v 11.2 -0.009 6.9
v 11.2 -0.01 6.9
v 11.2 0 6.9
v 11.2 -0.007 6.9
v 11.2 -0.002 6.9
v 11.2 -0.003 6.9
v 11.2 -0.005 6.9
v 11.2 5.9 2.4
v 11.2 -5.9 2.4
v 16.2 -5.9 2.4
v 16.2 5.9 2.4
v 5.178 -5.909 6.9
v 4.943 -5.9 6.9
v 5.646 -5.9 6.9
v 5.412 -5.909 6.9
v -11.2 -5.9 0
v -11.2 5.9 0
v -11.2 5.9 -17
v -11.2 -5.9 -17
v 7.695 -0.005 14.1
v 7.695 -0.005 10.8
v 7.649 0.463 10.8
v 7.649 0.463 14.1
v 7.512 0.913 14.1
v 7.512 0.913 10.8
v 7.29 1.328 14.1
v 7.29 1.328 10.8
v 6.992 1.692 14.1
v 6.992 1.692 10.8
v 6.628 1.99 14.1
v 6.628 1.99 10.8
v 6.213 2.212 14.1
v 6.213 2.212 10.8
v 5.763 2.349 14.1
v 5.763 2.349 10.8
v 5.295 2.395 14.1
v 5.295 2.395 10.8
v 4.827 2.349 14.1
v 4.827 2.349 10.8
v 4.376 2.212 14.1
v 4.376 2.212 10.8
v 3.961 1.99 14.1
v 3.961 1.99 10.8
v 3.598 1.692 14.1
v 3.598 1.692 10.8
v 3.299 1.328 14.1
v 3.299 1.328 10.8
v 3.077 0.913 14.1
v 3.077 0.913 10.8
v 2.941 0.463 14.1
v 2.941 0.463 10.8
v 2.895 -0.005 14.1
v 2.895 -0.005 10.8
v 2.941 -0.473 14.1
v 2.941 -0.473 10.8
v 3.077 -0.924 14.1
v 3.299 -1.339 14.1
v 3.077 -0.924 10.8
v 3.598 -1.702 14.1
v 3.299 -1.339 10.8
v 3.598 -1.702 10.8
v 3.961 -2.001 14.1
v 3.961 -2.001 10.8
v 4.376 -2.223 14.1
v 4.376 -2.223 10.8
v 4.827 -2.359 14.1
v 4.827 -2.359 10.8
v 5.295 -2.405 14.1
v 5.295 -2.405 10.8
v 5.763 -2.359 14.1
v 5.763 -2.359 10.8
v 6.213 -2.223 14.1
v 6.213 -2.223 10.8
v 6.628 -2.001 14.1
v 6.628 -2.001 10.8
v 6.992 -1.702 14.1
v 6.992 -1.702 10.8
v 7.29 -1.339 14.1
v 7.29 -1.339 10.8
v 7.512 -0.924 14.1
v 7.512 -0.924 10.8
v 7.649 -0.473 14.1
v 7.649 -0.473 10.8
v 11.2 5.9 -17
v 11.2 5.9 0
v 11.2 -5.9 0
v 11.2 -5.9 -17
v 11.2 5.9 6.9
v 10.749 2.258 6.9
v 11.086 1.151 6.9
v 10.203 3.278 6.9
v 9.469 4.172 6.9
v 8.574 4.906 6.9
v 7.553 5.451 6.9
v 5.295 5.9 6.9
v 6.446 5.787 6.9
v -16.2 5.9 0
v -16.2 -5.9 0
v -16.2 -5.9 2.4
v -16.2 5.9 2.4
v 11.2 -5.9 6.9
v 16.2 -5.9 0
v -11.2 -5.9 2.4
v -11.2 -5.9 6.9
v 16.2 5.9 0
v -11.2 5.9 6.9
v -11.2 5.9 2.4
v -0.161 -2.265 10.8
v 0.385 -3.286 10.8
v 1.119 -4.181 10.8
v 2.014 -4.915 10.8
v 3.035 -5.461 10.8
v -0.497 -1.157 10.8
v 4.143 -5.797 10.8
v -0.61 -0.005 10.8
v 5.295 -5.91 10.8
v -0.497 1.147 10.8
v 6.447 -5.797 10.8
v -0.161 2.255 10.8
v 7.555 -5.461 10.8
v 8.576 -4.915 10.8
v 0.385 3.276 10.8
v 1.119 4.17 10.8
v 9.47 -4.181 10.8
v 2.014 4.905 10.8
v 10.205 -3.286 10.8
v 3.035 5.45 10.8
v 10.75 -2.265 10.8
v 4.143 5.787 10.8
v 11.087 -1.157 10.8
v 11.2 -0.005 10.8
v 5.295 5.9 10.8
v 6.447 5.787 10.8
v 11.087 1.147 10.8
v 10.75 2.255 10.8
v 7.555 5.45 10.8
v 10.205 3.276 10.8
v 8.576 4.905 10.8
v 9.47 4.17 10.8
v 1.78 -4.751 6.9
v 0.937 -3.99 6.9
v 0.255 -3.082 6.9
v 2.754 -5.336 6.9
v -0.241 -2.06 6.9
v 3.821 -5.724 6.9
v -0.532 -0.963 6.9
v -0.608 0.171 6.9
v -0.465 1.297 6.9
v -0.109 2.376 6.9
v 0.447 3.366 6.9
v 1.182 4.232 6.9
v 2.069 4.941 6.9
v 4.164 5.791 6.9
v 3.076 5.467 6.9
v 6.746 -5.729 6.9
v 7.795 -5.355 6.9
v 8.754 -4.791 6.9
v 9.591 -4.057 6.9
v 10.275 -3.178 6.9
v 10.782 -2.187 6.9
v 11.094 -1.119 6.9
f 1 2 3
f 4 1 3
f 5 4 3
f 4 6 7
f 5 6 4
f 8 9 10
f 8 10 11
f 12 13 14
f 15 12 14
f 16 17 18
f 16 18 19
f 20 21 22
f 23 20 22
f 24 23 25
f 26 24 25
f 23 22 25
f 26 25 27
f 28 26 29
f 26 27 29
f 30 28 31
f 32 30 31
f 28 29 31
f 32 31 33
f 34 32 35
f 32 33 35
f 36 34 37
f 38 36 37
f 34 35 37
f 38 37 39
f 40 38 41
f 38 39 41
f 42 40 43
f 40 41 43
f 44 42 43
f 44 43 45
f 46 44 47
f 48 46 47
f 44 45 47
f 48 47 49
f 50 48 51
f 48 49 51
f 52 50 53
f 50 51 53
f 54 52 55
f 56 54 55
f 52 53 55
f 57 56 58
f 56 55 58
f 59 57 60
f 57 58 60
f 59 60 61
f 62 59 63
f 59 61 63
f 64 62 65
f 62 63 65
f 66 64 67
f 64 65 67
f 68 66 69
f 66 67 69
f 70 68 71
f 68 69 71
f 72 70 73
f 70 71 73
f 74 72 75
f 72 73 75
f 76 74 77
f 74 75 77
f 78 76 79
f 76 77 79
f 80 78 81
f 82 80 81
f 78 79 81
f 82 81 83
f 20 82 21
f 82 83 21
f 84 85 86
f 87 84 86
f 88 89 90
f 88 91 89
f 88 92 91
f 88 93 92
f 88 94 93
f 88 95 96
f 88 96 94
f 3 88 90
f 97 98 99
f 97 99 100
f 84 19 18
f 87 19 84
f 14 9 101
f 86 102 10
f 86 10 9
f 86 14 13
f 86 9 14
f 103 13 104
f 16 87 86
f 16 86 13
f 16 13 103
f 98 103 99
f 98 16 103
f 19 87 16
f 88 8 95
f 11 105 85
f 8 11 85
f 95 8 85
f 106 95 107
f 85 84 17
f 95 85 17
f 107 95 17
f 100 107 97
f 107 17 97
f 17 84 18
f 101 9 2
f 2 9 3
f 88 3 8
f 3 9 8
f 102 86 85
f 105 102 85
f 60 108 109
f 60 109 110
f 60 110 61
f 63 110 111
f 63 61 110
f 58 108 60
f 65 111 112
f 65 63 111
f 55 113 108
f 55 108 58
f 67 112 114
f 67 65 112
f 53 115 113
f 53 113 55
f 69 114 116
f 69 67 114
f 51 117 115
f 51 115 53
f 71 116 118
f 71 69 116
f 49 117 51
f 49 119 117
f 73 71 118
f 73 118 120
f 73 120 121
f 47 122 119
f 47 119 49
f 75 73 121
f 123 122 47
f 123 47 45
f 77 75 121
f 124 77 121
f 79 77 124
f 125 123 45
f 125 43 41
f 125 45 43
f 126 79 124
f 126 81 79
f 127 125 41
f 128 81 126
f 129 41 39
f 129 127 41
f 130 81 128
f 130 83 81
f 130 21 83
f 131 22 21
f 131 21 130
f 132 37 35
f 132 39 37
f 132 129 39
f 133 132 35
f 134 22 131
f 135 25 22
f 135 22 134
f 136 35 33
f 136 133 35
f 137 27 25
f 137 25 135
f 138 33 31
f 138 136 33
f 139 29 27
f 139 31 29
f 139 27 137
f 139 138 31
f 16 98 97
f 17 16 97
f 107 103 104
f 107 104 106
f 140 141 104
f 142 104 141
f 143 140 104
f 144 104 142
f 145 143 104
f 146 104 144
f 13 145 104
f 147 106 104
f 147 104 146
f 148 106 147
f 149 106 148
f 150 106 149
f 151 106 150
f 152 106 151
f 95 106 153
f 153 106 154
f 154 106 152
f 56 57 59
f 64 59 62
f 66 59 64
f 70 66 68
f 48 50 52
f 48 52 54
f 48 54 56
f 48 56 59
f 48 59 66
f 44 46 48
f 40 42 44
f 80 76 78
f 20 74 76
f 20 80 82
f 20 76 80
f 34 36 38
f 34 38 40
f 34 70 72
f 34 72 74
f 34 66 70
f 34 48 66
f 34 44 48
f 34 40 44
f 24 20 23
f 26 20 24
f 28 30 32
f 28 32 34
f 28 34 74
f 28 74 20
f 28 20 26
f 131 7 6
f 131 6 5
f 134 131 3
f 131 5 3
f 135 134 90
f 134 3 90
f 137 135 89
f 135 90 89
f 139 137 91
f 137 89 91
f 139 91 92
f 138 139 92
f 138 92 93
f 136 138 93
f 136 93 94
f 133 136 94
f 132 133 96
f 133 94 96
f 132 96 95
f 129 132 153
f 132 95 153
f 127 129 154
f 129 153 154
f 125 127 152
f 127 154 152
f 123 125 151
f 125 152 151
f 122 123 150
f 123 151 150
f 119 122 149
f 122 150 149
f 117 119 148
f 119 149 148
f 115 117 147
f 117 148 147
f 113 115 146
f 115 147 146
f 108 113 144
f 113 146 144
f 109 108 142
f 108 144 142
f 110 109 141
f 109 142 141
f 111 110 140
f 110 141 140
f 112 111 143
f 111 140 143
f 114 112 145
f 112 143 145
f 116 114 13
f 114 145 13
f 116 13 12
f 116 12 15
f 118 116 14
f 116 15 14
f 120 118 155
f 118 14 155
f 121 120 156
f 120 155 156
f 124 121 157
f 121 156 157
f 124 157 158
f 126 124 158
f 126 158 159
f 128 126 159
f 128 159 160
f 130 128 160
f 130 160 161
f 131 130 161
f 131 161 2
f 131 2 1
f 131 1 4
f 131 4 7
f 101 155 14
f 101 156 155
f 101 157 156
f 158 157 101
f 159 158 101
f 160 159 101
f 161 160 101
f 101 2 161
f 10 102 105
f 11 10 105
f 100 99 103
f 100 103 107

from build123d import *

# Parameters (mm, degrees)
CROQUIS1_W              = 11.8
CROQUIS1_H              = 32.4
SALIENTE_EXTRUIR1_DEPTH = 2.4
CROQUIS2_W              = 22.4
CROQUIS2_H              = 11.8
SALIENTE_EXTRUIR2_DEPTH = 4.5
CROQUIS3_R              = 5.905235569
SALIENTE_EXTRUIR3_DEPTH = 3.9
CROQUIS4_R              = 2.4
SALIENTE_EXTRUIR4_DEPTH = 3.3
CROQUIS5_W              = 22.4
CROQUIS5_H              = 11.8
SALIENTE_EXTRUIR5_DEPTH = 17


with BuildPart() as part:
    # Croquis1 → Saliente-Extruir1 (new body)
    with BuildSketch(Plane(origin=(0, 0, 0), x_dir=(0, 1, 0), z_dir=(0, 0, 1))):
        Rectangle(CROQUIS1_W, CROQUIS1_H)
    extrude(amount=SALIENTE_EXTRUIR1_DEPTH)

    # Croquis2 → Saliente-Extruir2 (add)
    with BuildSketch(Plane.XY.offset(2.4)):
        Rectangle(CROQUIS2_W, CROQUIS2_H)
    extrude(amount=SALIENTE_EXTRUIR2_DEPTH)

    # Croquis3 → Saliente-Extruir3 (add)
    with BuildSketch(Plane.XY.offset(6.9)):
        with Locations((5.294766752, -0.005235569)):
            Circle(CROQUIS3_R)
    extrude(amount=SALIENTE_EXTRUIR3_DEPTH)

    # Croquis4 → Saliente-Extruir4 (add)
    with BuildSketch(Plane.XY.offset(10.8)):
        with Locations((5.294766752, -0.005235569)):
            Circle(CROQUIS4_R)
    extrude(amount=SALIENTE_EXTRUIR4_DEPTH)

    # Croquis5 → Saliente-Extruir5 (add)
    with BuildSketch(Plane(origin=(0, 0, 0), x_dir=(1, 0, 0), z_dir=(0, 0, -1))):
        Rectangle(CROQUIS5_W, CROQUIS5_H)
    extrude(amount=SALIENTE_EXTRUIR5_DEPTH)


solid = part.part
